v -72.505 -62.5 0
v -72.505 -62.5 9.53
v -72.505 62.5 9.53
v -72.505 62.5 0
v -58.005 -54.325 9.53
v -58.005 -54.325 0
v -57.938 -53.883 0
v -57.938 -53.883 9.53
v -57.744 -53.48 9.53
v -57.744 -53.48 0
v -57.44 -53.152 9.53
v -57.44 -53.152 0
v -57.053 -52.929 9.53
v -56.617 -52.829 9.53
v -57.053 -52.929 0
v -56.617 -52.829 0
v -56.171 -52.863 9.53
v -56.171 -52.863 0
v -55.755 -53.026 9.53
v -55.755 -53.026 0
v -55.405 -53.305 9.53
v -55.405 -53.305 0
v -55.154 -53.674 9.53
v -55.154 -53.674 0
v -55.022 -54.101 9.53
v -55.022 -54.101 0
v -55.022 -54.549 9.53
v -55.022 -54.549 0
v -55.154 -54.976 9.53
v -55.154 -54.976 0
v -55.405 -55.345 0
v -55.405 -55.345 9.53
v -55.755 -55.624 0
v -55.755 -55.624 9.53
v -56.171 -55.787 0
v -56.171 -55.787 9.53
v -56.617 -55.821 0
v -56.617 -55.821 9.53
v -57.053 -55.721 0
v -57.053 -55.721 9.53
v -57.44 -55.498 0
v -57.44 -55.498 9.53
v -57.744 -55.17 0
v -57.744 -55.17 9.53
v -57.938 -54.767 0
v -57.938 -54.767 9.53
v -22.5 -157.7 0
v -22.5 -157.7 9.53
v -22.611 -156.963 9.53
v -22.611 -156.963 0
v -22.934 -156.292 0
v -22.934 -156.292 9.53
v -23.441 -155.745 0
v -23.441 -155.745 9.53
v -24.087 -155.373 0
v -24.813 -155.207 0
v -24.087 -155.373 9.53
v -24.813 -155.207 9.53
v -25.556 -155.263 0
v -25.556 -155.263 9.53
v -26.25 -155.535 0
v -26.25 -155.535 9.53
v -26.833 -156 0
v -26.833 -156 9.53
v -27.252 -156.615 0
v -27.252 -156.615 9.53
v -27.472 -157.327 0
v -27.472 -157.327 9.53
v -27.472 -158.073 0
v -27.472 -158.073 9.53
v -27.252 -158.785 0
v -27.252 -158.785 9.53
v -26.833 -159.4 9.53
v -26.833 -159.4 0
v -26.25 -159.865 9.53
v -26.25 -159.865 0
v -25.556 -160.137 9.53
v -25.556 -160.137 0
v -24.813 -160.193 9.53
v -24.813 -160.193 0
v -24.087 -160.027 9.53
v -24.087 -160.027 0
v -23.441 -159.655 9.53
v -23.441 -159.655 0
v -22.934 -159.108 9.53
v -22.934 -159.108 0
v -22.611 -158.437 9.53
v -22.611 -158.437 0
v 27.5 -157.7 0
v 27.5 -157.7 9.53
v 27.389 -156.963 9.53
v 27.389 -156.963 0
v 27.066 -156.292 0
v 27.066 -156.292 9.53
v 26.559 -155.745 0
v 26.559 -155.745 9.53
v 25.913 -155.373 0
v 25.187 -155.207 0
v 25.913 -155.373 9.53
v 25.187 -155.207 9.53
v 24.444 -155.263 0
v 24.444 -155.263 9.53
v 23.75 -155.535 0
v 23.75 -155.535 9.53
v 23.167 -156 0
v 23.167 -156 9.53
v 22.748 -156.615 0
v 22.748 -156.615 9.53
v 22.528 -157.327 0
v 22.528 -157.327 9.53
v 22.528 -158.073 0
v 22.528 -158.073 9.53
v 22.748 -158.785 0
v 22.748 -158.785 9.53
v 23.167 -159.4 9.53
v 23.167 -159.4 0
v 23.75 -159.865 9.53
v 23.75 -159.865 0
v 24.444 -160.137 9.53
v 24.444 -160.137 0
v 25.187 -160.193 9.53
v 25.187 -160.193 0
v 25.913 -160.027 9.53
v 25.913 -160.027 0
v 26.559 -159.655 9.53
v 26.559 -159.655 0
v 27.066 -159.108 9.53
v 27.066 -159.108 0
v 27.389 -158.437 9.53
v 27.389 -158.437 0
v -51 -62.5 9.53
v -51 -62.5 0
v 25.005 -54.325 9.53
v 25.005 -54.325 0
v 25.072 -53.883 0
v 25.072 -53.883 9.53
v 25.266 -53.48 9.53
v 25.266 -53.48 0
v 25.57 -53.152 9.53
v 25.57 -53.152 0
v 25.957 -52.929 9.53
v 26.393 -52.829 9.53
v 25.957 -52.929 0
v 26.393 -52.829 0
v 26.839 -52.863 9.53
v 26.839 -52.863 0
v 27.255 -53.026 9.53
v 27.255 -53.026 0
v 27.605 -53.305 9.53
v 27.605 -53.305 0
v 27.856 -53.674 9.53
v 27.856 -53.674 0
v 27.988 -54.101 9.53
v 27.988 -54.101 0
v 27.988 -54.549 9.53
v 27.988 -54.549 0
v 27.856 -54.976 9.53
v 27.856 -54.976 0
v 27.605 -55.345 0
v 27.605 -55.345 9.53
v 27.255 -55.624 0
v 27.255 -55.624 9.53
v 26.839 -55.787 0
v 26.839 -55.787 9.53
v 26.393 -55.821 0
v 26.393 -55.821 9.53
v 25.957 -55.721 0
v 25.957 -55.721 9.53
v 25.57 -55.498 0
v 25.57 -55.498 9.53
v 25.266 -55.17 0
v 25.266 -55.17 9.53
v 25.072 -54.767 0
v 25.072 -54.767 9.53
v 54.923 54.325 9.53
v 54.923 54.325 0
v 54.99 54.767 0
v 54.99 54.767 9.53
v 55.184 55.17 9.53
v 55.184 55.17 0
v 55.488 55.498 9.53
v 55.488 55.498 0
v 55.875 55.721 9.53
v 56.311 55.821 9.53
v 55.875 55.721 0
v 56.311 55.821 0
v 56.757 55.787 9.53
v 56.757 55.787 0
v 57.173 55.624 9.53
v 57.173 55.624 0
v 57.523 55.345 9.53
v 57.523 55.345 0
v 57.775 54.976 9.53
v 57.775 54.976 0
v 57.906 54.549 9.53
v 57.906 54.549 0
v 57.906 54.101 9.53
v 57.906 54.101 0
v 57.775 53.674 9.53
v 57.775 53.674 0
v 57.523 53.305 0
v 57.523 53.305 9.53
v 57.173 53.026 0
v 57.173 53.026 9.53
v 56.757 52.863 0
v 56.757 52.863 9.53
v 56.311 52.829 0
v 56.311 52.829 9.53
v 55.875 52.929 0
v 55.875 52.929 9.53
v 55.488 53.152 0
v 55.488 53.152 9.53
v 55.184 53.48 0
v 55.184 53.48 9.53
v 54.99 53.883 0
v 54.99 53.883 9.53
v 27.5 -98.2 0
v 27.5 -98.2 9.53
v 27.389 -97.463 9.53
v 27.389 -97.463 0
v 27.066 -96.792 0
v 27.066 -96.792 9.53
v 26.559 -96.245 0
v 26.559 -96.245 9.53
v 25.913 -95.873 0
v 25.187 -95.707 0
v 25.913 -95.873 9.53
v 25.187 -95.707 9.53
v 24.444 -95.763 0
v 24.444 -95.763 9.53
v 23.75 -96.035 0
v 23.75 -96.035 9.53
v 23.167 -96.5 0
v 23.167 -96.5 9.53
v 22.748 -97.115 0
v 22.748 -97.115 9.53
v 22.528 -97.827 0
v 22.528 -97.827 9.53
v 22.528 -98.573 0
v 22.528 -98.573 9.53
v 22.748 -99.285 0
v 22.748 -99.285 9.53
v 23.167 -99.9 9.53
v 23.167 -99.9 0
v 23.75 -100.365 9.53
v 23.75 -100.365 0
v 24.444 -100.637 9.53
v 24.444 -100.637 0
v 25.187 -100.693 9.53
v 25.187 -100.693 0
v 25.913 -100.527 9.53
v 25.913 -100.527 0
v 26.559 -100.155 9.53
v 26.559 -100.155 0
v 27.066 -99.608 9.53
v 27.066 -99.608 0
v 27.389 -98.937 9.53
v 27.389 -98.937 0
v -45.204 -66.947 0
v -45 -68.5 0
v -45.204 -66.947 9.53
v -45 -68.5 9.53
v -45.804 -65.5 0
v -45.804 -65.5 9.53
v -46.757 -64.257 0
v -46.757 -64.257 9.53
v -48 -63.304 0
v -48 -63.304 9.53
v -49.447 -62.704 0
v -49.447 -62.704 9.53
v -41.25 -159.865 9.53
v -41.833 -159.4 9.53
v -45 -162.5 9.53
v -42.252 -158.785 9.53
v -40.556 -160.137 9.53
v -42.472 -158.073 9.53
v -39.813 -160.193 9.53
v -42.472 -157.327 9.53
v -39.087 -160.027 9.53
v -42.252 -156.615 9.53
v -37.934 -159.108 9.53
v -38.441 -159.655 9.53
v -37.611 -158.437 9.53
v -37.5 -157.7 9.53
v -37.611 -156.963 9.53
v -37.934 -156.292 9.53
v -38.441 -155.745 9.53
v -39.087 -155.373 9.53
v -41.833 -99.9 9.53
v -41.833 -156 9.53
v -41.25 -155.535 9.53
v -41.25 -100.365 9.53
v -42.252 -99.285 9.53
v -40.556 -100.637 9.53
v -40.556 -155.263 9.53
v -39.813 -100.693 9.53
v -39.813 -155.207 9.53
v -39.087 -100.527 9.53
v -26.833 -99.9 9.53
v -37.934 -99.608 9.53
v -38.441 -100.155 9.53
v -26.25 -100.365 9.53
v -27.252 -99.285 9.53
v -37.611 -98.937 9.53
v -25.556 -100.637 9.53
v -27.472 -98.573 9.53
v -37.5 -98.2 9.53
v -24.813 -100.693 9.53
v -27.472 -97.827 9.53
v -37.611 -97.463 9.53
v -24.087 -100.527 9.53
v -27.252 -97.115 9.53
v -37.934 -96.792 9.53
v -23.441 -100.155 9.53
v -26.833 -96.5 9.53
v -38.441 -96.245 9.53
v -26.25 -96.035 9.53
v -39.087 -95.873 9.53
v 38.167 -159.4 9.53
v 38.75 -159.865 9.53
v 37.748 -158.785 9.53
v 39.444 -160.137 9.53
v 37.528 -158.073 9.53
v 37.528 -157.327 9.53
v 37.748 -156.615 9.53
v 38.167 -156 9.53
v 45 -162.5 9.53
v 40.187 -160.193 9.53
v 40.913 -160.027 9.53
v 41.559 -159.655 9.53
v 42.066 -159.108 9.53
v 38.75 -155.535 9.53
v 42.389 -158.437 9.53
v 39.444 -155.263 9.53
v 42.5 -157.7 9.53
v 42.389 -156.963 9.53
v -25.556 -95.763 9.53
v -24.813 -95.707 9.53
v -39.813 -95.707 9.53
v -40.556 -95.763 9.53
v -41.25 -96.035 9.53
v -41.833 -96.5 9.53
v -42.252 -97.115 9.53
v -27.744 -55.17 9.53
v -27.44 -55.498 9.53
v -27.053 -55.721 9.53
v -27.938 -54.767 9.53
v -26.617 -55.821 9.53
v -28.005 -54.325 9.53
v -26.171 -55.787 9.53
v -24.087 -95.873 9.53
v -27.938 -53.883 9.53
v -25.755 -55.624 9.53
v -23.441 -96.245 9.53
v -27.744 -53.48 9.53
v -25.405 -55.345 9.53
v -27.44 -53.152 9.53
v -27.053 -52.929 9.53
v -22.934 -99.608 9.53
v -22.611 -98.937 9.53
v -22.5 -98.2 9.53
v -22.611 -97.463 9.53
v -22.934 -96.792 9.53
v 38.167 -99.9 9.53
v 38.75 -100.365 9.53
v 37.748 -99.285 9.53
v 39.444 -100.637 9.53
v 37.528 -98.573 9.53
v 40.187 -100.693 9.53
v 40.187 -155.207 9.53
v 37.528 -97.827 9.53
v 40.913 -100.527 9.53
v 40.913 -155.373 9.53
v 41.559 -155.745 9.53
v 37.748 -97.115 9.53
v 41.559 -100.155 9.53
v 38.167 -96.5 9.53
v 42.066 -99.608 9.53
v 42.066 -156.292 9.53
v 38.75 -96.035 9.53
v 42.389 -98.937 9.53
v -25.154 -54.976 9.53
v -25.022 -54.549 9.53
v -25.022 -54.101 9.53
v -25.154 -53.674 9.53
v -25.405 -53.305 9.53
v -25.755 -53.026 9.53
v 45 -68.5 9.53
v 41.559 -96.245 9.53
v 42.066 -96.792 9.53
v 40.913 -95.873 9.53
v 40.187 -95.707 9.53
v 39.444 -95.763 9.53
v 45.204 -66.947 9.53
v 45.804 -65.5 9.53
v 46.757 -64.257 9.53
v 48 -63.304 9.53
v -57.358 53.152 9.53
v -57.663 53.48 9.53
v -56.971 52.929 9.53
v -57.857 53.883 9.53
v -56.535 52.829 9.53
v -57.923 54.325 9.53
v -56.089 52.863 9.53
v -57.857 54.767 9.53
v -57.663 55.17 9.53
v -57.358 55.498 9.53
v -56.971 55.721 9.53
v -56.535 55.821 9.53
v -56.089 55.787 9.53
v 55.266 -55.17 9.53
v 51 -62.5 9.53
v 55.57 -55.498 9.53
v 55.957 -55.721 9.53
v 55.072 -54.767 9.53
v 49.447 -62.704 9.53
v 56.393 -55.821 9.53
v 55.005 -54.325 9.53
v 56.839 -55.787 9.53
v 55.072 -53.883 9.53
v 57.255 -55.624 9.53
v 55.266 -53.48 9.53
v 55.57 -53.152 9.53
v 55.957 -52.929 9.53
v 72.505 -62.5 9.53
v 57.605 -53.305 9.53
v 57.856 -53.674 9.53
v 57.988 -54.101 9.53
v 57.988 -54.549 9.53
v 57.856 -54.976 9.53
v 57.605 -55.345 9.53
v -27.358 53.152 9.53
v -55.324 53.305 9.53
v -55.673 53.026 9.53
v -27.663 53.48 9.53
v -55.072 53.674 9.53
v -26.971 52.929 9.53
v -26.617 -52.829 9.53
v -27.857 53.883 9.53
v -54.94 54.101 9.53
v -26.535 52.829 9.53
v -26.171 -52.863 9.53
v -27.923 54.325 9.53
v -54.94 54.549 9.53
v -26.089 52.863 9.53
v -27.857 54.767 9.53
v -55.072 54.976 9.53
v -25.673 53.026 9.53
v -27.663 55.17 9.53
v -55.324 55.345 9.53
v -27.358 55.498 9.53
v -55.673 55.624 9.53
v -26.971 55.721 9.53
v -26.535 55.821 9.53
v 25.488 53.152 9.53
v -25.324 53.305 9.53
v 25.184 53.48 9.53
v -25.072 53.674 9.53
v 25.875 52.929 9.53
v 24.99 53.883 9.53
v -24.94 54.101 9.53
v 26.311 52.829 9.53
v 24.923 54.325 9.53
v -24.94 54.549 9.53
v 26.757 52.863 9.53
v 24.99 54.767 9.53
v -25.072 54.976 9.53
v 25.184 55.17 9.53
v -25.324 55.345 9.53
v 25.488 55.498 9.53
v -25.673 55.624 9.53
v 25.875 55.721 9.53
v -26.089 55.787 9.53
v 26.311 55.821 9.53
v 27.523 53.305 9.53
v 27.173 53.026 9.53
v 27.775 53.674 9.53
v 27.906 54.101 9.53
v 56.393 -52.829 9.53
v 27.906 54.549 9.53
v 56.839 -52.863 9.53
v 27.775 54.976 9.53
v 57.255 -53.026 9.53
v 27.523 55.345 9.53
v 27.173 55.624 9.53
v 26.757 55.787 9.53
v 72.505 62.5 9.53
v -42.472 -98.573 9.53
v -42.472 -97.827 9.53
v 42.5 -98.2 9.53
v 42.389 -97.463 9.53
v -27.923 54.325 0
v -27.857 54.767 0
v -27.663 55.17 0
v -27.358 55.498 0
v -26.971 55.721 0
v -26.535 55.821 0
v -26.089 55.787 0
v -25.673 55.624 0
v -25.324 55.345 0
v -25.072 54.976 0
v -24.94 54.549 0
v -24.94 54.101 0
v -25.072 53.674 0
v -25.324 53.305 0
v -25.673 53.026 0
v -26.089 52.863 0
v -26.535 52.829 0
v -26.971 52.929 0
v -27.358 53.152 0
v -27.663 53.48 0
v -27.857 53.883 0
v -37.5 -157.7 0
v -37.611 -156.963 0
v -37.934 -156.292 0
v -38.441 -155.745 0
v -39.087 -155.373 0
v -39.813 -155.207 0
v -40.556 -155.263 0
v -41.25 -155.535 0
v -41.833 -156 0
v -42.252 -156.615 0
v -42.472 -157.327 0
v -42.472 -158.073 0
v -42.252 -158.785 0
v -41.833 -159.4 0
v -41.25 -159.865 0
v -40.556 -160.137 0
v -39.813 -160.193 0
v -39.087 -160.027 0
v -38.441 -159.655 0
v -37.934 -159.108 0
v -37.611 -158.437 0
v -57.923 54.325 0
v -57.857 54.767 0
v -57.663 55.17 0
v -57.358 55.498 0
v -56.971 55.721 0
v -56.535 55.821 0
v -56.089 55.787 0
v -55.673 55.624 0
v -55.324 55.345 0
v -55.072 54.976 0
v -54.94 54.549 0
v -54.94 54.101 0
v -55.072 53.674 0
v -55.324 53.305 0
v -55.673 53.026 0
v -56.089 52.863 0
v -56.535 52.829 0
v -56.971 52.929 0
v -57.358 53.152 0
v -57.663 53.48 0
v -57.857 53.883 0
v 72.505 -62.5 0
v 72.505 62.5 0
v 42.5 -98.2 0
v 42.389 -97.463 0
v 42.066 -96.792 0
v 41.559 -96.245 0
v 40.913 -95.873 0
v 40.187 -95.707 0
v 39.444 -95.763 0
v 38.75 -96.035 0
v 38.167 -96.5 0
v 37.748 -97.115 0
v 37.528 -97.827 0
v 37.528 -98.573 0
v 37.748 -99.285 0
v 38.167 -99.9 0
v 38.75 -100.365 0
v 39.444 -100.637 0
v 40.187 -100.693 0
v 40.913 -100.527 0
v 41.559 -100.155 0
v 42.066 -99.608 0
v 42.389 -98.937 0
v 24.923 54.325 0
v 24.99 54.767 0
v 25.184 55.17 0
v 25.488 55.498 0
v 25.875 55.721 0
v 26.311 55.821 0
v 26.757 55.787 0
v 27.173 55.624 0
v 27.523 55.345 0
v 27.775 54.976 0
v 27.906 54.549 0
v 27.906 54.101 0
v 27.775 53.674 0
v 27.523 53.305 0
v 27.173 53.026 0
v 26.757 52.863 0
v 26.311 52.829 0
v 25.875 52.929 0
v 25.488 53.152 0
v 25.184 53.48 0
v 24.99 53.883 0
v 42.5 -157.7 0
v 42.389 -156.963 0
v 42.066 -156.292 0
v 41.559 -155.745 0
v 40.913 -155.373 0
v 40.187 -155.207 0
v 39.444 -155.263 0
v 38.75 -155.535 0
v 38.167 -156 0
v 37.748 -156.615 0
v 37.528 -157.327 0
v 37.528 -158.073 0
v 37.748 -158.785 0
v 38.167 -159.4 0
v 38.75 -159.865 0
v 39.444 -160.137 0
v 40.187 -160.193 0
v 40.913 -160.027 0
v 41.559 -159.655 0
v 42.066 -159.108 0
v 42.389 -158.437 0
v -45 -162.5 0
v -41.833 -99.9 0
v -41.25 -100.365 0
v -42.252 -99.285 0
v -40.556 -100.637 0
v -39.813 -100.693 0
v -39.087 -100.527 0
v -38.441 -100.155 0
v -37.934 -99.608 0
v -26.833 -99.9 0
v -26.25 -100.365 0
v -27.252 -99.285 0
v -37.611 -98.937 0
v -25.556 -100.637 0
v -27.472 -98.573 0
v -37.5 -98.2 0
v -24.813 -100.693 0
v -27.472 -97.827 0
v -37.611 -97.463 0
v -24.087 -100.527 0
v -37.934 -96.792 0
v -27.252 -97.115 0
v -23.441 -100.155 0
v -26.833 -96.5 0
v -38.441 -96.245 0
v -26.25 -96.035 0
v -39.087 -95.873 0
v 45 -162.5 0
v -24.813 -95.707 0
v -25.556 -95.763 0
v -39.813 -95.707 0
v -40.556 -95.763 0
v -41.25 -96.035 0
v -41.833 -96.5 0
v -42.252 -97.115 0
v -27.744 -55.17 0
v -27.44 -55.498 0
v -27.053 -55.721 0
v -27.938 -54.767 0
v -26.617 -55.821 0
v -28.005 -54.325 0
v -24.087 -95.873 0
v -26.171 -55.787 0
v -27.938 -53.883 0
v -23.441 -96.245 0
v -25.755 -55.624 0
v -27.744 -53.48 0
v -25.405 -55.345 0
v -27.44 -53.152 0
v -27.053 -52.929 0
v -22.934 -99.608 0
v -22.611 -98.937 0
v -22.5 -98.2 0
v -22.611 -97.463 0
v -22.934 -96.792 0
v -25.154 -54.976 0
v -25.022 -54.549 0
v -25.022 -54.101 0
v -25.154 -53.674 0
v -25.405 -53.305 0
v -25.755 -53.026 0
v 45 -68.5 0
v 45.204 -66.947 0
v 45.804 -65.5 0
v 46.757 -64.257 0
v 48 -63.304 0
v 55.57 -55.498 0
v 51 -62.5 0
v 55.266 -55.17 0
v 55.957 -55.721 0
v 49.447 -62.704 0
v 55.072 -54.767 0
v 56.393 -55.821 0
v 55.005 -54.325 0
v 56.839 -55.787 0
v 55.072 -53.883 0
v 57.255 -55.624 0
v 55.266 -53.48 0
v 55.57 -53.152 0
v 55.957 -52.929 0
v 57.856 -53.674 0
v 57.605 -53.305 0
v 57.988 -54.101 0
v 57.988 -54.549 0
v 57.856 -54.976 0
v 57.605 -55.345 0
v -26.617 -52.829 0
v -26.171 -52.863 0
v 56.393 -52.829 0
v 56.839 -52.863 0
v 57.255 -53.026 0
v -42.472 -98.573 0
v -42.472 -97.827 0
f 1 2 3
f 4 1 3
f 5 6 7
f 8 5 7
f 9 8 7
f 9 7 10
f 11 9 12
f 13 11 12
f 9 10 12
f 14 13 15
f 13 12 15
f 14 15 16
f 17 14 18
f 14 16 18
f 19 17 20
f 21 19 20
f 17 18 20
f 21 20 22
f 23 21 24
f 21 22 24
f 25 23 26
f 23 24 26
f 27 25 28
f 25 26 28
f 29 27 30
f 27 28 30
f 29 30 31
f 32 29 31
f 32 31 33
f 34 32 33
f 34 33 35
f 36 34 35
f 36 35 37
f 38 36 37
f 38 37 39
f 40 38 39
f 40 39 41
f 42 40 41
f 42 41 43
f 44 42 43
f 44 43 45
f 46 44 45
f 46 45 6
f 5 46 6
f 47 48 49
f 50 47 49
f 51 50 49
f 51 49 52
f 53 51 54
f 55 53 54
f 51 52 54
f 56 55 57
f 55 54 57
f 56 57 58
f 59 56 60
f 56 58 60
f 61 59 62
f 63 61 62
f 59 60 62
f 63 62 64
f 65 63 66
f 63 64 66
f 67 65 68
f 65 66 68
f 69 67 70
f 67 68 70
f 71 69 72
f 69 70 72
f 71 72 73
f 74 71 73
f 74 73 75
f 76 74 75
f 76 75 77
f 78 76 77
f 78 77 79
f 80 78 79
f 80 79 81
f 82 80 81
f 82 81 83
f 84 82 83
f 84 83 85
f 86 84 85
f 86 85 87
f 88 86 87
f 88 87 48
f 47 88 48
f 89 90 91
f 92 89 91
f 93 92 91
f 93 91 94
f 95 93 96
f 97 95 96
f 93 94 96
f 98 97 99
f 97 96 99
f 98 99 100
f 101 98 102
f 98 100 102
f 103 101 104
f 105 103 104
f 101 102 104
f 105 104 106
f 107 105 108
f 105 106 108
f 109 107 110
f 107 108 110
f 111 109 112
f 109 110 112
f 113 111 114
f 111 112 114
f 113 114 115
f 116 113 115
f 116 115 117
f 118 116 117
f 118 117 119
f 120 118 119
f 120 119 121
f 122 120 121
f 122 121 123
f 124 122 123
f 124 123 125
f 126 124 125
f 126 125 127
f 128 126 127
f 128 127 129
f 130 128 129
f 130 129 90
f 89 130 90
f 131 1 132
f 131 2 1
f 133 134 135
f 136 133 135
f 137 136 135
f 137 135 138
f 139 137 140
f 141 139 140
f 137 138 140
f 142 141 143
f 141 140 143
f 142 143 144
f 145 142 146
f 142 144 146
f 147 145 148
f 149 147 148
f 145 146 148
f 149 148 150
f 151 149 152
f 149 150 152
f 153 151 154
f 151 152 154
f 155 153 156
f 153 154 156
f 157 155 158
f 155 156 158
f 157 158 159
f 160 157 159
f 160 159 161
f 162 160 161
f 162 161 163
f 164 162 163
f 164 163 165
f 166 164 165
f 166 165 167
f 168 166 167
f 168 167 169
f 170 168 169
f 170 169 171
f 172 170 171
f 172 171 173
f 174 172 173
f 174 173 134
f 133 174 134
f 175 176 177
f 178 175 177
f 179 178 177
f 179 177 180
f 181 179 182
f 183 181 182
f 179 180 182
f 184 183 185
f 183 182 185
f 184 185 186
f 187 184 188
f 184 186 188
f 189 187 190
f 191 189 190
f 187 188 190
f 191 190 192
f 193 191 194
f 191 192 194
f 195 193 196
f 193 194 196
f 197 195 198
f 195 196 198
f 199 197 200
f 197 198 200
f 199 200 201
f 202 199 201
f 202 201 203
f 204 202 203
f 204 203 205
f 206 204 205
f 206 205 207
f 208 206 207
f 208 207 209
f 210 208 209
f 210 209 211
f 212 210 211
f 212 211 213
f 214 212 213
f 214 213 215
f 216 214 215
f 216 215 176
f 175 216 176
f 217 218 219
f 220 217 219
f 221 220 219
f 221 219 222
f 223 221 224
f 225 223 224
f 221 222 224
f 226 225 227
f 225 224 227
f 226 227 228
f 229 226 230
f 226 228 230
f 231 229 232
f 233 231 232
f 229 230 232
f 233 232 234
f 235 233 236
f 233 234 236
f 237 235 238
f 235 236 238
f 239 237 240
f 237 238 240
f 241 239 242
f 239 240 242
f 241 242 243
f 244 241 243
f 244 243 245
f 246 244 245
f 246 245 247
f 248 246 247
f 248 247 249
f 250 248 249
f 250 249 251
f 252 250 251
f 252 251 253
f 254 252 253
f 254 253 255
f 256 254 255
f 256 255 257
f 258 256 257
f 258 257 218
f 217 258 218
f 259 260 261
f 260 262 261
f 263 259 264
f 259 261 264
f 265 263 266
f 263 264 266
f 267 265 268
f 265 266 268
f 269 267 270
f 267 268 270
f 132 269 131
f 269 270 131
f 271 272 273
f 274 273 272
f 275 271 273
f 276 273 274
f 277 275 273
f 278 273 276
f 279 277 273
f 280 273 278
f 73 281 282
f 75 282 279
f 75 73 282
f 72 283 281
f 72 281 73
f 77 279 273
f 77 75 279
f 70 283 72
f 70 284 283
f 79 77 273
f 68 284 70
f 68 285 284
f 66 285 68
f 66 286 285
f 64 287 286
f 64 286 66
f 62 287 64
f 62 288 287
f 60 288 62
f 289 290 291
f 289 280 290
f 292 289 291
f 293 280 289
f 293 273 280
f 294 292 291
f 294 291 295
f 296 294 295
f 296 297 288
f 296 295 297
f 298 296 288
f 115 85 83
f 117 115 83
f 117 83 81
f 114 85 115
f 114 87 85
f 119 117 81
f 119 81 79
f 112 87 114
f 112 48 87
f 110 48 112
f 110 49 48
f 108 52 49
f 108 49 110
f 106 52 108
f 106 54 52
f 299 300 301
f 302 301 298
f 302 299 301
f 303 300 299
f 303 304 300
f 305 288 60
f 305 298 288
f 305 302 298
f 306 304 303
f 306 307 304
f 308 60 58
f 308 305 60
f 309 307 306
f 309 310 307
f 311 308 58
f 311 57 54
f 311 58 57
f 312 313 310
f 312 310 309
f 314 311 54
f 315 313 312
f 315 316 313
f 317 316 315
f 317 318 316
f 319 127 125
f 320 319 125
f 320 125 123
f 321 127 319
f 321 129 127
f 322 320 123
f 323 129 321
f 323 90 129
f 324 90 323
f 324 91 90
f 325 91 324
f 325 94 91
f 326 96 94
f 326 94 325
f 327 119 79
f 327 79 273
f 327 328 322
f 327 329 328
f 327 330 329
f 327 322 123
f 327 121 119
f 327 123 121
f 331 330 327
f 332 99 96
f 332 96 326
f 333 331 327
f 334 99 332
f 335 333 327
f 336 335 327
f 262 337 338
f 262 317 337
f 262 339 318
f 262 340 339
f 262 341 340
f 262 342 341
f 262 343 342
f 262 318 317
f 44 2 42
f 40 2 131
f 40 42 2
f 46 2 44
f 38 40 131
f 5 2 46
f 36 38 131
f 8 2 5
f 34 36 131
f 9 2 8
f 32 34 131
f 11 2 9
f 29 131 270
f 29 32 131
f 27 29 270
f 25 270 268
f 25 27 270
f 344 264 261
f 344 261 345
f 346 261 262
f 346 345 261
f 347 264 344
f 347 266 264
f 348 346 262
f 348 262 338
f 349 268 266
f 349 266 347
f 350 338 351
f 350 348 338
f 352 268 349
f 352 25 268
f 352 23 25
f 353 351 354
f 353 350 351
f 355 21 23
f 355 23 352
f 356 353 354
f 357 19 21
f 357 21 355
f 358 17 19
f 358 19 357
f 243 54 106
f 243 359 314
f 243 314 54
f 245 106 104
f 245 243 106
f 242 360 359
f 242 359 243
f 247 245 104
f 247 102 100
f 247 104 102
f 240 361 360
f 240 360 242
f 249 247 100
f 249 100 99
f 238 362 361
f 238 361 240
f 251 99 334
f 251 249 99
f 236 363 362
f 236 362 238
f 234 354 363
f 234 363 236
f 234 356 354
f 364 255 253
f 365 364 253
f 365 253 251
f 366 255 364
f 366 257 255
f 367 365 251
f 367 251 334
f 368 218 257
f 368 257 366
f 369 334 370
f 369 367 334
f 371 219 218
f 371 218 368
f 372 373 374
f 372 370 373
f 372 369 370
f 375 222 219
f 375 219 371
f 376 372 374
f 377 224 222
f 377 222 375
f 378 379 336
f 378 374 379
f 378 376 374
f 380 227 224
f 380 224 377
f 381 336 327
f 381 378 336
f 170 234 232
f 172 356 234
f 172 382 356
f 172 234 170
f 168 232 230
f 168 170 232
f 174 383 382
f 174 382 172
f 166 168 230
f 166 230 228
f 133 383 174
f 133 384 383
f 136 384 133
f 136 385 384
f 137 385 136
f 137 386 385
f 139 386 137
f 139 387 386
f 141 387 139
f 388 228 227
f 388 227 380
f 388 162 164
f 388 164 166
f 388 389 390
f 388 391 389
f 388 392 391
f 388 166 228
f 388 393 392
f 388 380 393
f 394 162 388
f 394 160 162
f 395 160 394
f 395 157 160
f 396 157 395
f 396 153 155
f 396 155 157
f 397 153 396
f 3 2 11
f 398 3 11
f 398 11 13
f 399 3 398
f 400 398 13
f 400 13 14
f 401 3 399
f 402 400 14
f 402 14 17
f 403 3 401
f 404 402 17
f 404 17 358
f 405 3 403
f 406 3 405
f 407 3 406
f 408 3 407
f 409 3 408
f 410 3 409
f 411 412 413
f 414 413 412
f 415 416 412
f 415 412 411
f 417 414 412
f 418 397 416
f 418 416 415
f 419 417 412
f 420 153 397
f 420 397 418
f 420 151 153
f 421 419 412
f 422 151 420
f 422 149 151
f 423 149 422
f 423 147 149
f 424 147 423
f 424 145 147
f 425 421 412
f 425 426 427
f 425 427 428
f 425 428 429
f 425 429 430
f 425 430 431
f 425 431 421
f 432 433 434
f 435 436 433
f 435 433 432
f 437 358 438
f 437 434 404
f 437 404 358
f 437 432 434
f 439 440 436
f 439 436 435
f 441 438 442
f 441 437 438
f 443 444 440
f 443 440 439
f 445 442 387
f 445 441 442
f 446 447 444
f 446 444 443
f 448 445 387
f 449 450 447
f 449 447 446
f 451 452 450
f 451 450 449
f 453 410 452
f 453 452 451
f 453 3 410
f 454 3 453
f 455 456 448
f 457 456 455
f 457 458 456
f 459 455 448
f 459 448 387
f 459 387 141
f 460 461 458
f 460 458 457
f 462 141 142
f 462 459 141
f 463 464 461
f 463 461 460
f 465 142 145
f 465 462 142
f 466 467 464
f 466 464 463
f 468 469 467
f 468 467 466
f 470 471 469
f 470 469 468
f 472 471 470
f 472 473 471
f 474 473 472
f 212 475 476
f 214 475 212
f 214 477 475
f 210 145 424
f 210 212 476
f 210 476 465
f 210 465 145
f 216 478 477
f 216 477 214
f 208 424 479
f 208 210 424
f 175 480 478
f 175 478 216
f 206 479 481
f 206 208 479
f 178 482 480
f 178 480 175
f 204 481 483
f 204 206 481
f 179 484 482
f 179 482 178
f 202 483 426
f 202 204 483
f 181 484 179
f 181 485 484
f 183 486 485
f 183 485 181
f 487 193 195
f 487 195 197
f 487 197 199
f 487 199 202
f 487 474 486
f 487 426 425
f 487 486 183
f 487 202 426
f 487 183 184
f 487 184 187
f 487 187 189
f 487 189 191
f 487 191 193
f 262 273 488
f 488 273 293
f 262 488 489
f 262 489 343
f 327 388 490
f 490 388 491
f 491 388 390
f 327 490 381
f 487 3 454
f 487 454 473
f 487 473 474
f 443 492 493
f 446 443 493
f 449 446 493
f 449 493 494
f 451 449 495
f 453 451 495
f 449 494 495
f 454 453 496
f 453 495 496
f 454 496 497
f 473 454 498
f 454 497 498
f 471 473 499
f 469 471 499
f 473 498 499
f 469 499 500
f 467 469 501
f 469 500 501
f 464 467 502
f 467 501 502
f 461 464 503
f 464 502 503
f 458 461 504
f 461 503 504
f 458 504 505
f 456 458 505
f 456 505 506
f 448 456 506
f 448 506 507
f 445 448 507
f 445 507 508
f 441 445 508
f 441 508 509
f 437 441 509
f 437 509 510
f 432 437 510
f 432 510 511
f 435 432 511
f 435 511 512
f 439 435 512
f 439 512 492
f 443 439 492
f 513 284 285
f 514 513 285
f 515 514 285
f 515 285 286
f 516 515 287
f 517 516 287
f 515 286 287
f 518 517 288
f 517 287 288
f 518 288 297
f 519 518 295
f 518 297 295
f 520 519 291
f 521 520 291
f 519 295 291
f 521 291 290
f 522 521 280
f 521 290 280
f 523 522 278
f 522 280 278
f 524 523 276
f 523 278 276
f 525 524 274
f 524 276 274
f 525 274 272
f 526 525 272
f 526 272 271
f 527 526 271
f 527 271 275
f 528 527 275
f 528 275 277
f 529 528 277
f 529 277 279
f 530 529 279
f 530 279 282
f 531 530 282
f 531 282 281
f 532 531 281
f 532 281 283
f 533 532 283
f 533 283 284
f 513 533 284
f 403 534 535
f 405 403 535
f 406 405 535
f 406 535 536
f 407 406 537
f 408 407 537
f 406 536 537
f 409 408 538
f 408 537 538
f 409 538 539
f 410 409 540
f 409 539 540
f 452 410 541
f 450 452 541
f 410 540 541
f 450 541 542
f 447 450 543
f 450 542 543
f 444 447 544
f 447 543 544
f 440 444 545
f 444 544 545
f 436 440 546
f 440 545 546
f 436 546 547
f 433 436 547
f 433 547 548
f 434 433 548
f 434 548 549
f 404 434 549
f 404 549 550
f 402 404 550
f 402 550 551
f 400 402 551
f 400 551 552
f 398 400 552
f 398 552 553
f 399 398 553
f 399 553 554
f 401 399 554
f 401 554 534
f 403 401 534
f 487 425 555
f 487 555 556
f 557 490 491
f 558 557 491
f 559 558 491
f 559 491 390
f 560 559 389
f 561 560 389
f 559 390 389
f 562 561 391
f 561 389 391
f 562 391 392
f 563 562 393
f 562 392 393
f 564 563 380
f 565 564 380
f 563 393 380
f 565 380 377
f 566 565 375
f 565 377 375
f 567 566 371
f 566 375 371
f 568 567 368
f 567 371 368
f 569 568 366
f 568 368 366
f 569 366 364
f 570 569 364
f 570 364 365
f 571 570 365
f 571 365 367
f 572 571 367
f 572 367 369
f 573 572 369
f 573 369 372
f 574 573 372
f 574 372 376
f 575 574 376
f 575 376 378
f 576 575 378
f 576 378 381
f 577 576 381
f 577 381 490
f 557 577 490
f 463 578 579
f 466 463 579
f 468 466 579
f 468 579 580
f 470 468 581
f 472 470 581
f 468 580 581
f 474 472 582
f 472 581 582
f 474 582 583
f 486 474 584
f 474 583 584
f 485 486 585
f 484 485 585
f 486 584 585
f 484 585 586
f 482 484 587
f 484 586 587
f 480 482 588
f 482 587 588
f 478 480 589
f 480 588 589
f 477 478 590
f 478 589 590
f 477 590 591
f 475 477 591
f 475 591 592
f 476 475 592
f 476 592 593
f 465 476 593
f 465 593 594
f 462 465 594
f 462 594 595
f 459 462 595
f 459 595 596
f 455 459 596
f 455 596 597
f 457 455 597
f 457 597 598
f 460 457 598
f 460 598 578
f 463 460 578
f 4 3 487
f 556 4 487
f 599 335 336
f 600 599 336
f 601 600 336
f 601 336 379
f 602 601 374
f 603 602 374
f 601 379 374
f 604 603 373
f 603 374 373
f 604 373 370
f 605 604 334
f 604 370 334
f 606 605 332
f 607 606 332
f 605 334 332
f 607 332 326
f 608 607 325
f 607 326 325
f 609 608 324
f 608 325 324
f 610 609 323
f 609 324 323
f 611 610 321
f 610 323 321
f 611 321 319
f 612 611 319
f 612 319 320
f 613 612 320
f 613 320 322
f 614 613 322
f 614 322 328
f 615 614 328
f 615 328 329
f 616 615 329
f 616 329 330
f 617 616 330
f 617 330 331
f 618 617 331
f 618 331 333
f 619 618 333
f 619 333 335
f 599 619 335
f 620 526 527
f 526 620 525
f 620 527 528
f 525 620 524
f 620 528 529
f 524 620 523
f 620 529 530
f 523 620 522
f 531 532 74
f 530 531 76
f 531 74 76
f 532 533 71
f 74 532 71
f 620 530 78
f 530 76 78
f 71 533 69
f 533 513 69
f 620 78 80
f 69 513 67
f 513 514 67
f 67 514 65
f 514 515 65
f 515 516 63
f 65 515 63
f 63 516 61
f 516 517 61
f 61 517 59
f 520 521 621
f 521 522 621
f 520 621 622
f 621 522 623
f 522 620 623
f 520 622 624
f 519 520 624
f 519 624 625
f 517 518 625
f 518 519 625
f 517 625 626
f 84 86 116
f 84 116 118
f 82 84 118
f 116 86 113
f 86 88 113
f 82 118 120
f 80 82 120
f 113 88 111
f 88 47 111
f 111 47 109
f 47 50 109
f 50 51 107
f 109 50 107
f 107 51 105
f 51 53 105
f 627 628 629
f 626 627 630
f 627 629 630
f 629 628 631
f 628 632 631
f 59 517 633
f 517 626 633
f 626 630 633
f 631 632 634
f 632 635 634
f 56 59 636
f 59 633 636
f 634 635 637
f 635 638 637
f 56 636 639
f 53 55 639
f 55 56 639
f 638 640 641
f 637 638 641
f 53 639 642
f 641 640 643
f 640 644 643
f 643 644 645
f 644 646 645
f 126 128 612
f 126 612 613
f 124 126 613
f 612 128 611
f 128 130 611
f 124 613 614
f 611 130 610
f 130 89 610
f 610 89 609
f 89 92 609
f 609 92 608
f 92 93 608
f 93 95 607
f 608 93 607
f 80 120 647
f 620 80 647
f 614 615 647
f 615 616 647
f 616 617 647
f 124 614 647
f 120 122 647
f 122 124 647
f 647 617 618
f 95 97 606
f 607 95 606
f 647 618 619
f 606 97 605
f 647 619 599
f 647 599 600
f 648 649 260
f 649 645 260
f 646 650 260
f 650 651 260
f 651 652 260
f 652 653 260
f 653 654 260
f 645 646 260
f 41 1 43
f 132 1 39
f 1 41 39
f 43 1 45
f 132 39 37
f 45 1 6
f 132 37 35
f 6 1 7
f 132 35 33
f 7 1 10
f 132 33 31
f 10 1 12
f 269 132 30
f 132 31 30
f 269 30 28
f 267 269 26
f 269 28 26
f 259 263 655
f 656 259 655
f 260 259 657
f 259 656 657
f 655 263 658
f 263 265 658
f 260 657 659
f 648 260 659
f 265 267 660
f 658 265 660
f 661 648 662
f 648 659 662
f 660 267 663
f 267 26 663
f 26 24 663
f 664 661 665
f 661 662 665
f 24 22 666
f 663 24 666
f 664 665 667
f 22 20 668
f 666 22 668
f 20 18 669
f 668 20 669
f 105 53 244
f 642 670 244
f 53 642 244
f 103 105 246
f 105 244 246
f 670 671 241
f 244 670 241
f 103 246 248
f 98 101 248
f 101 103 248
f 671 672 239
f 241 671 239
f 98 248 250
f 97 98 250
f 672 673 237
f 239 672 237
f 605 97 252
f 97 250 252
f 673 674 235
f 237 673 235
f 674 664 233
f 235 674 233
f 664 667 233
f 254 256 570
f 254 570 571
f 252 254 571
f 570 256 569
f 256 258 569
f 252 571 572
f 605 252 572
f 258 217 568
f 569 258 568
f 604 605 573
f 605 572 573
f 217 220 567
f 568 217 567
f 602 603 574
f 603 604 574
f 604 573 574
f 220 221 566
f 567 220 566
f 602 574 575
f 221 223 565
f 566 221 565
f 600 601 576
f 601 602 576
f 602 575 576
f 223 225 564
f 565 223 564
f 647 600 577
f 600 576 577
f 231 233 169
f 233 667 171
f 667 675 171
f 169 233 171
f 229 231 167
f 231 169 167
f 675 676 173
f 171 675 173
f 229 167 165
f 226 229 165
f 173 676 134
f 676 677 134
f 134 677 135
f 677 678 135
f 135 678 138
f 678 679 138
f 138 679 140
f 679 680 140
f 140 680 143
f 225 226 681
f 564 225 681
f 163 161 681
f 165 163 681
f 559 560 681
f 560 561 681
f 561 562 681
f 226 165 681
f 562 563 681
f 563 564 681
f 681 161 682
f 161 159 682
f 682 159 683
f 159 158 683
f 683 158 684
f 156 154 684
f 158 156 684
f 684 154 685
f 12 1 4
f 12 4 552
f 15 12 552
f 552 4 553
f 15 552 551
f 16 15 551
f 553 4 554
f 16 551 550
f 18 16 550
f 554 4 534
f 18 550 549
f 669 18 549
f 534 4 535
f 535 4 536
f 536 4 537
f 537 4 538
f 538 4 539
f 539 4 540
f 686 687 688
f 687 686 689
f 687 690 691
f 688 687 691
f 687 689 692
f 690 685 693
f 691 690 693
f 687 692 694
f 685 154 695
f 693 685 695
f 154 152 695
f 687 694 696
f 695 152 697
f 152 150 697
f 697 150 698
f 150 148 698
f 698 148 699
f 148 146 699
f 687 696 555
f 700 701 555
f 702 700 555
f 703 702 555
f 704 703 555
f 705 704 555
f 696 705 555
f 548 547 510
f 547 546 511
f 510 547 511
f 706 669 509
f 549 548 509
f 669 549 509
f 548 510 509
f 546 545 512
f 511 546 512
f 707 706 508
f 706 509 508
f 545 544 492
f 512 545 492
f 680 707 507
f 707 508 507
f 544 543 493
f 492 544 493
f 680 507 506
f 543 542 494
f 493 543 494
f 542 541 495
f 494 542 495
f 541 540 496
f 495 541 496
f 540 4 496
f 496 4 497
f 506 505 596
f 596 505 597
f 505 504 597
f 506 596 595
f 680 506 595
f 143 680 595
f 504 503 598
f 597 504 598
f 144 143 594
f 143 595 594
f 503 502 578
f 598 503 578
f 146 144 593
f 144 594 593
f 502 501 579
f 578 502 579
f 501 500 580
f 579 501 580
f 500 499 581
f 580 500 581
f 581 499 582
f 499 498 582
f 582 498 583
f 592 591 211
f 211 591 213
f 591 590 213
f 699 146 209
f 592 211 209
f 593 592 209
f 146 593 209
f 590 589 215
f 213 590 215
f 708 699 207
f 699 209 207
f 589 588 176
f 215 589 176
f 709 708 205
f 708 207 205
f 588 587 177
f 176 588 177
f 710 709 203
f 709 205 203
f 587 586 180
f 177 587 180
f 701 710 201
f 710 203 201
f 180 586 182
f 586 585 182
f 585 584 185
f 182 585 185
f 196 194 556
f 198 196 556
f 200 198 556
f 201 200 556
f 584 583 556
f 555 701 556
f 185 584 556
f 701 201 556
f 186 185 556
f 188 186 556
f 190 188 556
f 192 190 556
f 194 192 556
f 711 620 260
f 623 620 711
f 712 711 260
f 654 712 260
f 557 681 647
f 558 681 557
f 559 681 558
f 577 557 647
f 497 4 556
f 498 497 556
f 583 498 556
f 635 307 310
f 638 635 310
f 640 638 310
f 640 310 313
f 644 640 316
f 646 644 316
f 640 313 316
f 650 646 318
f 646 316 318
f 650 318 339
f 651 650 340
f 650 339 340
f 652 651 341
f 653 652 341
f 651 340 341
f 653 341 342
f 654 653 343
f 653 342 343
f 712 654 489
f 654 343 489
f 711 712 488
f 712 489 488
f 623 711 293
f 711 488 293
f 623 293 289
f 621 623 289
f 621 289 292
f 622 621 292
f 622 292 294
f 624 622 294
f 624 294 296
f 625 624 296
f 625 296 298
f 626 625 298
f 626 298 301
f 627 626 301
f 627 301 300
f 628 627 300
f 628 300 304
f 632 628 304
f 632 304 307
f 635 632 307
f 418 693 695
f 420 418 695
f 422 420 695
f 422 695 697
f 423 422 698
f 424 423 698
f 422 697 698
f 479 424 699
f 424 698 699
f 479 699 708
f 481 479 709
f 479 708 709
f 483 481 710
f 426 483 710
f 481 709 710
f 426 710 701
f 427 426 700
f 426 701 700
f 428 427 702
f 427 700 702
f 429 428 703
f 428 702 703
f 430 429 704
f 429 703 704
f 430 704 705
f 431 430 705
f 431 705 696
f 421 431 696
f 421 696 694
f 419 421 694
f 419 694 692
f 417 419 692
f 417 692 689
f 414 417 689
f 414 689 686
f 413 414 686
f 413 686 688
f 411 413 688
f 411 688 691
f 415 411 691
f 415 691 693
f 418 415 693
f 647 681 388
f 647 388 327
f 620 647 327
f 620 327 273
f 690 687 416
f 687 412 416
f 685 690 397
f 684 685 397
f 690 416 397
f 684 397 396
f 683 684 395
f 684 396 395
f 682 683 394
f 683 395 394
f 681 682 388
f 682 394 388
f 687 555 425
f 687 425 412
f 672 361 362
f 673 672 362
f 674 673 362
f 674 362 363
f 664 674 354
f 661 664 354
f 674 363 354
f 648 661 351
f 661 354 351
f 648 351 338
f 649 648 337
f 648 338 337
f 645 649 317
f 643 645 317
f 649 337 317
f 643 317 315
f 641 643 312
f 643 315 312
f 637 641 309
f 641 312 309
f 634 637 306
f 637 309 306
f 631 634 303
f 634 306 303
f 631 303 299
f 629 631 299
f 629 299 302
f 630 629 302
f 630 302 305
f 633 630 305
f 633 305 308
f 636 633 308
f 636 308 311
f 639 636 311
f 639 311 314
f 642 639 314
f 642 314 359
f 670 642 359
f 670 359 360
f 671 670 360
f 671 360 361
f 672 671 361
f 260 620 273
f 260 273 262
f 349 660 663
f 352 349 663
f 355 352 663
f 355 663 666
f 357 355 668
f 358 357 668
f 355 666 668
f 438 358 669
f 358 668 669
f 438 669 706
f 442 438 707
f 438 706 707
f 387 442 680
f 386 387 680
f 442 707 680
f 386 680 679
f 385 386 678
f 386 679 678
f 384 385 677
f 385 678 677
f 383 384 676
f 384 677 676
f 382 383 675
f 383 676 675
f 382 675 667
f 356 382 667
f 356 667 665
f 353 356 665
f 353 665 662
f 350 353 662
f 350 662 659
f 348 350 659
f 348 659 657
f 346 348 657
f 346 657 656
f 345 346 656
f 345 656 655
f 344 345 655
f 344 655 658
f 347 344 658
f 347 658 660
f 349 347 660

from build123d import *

# Parameters (mm, degrees)
RESSALTO_EXTRUS_O1_DEPTH = 9.53
CORTE_EXTRUS_O1_REACH    = 179.792
ESBO_O2_R                = 2.5
CORTE_EXTRUS_O2_REACH    = 179.792
ESBO_O3_R                = 1.5
CROQUIS1_W               = 1
CROQUIS1_H               = 125
SALIENTE_EXTRUIR1_DEPTH  = 9.53
REDONDEO1_R              = 6


with BuildPart() as part:
    # Esboço1 → Ressalto-extrusão1 (new body)
    with BuildSketch(Plane.XY):
        Polygon((-71.505, 62.5), (71.505, 62.5), (71.505, -62.5), (45, -62.5), (45, -162.5), (-45, -162.5), (-45, -62.5), (-71.505, -62.5), align=None)
    extrude(amount=RESSALTO_EXTRUS_O1_DEPTH)

    # Esboço2 → Corte-extrusão1 (cut, up to next)
    with BuildSketch(Plane.XY.offset(9.53), mode=Mode.PRIVATE) as corte_extrus_o1_sk1:
        with Locations((-40, -157.7)):
            Circle(ESBO_O2_R)
    corte_extrus_o1_tool1 = extrude(corte_extrus_o1_sk1.sketch, amount=-CORTE_EXTRUS_O1_REACH, mode=Mode.PRIVATE) & part.part
    # Esboço2 → Corte-extrusão1 (cut, up to next)
    with BuildSketch(Plane.XY.offset(9.53), mode=Mode.PRIVATE) as corte_extrus_o1_sk2:
        with Locations((-25, -157.7)):
            Circle(ESBO_O2_R)
    corte_extrus_o1_tool2 = extrude(corte_extrus_o1_sk2.sketch, amount=-CORTE_EXTRUS_O1_REACH, mode=Mode.PRIVATE) & part.part
    # Esboço2 → Corte-extrusão1 (cut, up to next)
    with BuildSketch(Plane.XY.offset(9.53), mode=Mode.PRIVATE) as corte_extrus_o1_sk3:
        with Locations((25, -157.7)):
            Circle(ESBO_O2_R)
    corte_extrus_o1_tool3 = extrude(corte_extrus_o1_sk3.sketch, amount=-CORTE_EXTRUS_O1_REACH, mode=Mode.PRIVATE) & part.part
    # Esboço2 → Corte-extrusão1 (cut, up to next)
    with BuildSketch(Plane.XY.offset(9.53), mode=Mode.PRIVATE) as corte_extrus_o1_sk4:
        with Locations((40, -157.7)):
            Circle(ESBO_O2_R)
    corte_extrus_o1_tool4 = extrude(corte_extrus_o1_sk4.sketch, amount=-CORTE_EXTRUS_O1_REACH, mode=Mode.PRIVATE) & part.part
    # Esboço2 → Corte-extrusão1 (cut, up to next)
    with BuildSketch(Plane.XY.offset(9.53), mode=Mode.PRIVATE) as corte_extrus_o1_sk5:
        with Locations((40, -98.2)):
            Circle(ESBO_O2_R)
    corte_extrus_o1_tool5 = extrude(corte_extrus_o1_sk5.sketch, amount=-CORTE_EXTRUS_O1_REACH, mode=Mode.PRIVATE) & part.part
    # Esboço2 → Corte-extrusão1 (cut, up to next)
    with BuildSketch(Plane.XY.offset(9.53), mode=Mode.PRIVATE) as corte_extrus_o1_sk6:
        with Locations((25, -98.2)):
            Circle(ESBO_O2_R)
    corte_extrus_o1_tool6 = extrude(corte_extrus_o1_sk6.sketch, amount=-CORTE_EXTRUS_O1_REACH, mode=Mode.PRIVATE) & part.part
    # Esboço2 → Corte-extrusão1 (cut, up to next)
    with BuildSketch(Plane.XY.offset(9.53), mode=Mode.PRIVATE) as corte_extrus_o1_sk7:
        with Locations((-25, -98.2)):
            Circle(ESBO_O2_R)
    corte_extrus_o1_tool7 = extrude(corte_extrus_o1_sk7.sketch, amount=-CORTE_EXTRUS_O1_REACH, mode=Mode.PRIVATE) & part.part
    # Esboço2 → Corte-extrusão1 (cut, up to next)
    with BuildSketch(Plane.XY.offset(9.53), mode=Mode.PRIVATE) as corte_extrus_o1_sk8:
        with Locations((-40, -98.2)):
            Circle(ESBO_O2_R)
    corte_extrus_o1_tool8 = extrude(corte_extrus_o1_sk8.sketch, amount=-CORTE_EXTRUS_O1_REACH, mode=Mode.PRIVATE) & part.part
    add(corte_extrus_o1_tool1.solids().sort_by_distance((-40, -157.7, 9.53))[0], mode=Mode.SUBTRACT)
    add(corte_extrus_o1_tool2.solids().sort_by_distance((-25, -157.7, 9.53))[0], mode=Mode.SUBTRACT)
    add(corte_extrus_o1_tool3.solids().sort_by_distance((25, -157.7, 9.53))[0], mode=Mode.SUBTRACT)
    add(corte_extrus_o1_tool4.solids().sort_by_distance((40, -157.7, 9.53))[0], mode=Mode.SUBTRACT)
    add(corte_extrus_o1_tool5.solids().sort_by_distance((40, -98.2, 9.53))[0], mode=Mode.SUBTRACT)
    add(corte_extrus_o1_tool6.solids().sort_by_distance((25, -98.2, 9.53))[0], mode=Mode.SUBTRACT)
    add(corte_extrus_o1_tool7.solids().sort_by_distance((-25, -98.2, 9.53))[0], mode=Mode.SUBTRACT)
    add(corte_extrus_o1_tool8.solids().sort_by_distance((-40, -98.2, 9.53))[0], mode=Mode.SUBTRACT)

    # Esboço3 → Corte-extrusão2 (cut, up to next)
    with BuildSketch(Plane(origin=(0, 0, 0), x_dir=(-1, 0, 0), z_dir=(0, 0, -1)), mode=Mode.PRIVATE) as corte_extrus_o2_sk1:
        with Locations((56.505, -54.325)):
            Circle(ESBO_O3_R)
    corte_extrus_o2_tool1 = extrude(corte_extrus_o2_sk1.sketch, amount=-CORTE_EXTRUS_O2_REACH, mode=Mode.PRIVATE) & part.part
    # Esboço3 → Corte-extrusão2 (cut, up to next)
    with BuildSketch(Plane(origin=(0, 0, 0), x_dir=(-1, 0, 0), z_dir=(0, 0, -1)), mode=Mode.PRIVATE) as corte_extrus_o2_sk2:
        with Locations((26.505, -54.325)):
            Circle(ESBO_O3_R)
    corte_extrus_o2_tool2 = extrude(corte_extrus_o2_sk2.sketch, amount=-CORTE_EXTRUS_O2_REACH, mode=Mode.PRIVATE) & part.part
    # Esboço3 → Corte-extrusão2 (cut, up to next)
    with BuildSketch(Plane(origin=(0, 0, 0), x_dir=(-1, 0, 0), z_dir=(0, 0, -1)), mode=Mode.PRIVATE) as corte_extrus_o2_sk3:
        with Locations((-26.505, -54.325)):
            Circle(ESBO_O3_R)
    corte_extrus_o2_tool3 = extrude(corte_extrus_o2_sk3.sketch, amount=-CORTE_EXTRUS_O2_REACH, mode=Mode.PRIVATE) & part.part
    # Esboço3 → Corte-extrusão2 (cut, up to next)
    with BuildSketch(Plane(origin=(0, 0, 0), x_dir=(-1, 0, 0), z_dir=(0, 0, -1)), mode=Mode.PRIVATE) as corte_extrus_o2_sk4:
        with Locations((-56.505, -54.325)):
            Circle(ESBO_O3_R)
    corte_extrus_o2_tool4 = extrude(corte_extrus_o2_sk4.sketch, amount=-CORTE_EXTRUS_O2_REACH, mode=Mode.PRIVATE) & part.part
    # Esboço3 → Corte-extrusão2 (cut, up to next)
    with BuildSketch(Plane(origin=(0, 0, 0), x_dir=(-1, 0, 0), z_dir=(0, 0, -1)), mode=Mode.PRIVATE) as corte_extrus_o2_sk5:
        with Locations((-56.423186497, 54.325)):
            Circle(ESBO_O3_R)
    corte_extrus_o2_tool5 = extrude(corte_extrus_o2_sk5.sketch, amount=-CORTE_EXTRUS_O2_REACH, mode=Mode.PRIVATE) & part.part
    # Esboço3 → Corte-extrusão2 (cut, up to next)
    with BuildSketch(Plane(origin=(0, 0, 0), x_dir=(-1, 0, 0), z_dir=(0, 0, -1)), mode=Mode.PRIVATE) as corte_extrus_o2_sk6:
        with Locations((-26.423186497, 54.325)):
            Circle(ESBO_O3_R)
    corte_extrus_o2_tool6 = extrude(corte_extrus_o2_sk6.sketch, amount=-CORTE_EXTRUS_O2_REACH, mode=Mode.PRIVATE) & part.part
    # Esboço3 → Corte-extrusão2 (cut, up to next)
    with BuildSketch(Plane(origin=(0, 0, 0), x_dir=(-1, 0, 0), z_dir=(0, 0, -1)), mode=Mode.PRIVATE) as corte_extrus_o2_sk7:
        with Locations((56.423186497, 54.325)):
            Circle(ESBO_O3_R)
    corte_extrus_o2_tool7 = extrude(corte_extrus_o2_sk7.sketch, amount=-CORTE_EXTRUS_O2_REACH, mode=Mode.PRIVATE) & part.part
    # Esboço3 → Corte-extrusão2 (cut, up to next)
    with BuildSketch(Plane(origin=(0, 0, 0), x_dir=(-1, 0, 0), z_dir=(0, 0, -1)), mode=Mode.PRIVATE) as corte_extrus_o2_sk8:
        with Locations((26.423186497, 54.325)):
            Circle(ESBO_O3_R)
    corte_extrus_o2_tool8 = extrude(corte_extrus_o2_sk8.sketch, amount=-CORTE_EXTRUS_O2_REACH, mode=Mode.PRIVATE) & part.part
    add(corte_extrus_o2_tool1.solids().sort_by_distance((-56.505, -54.325, 0))[0], mode=Mode.SUBTRACT)
    add(corte_extrus_o2_tool2.solids().sort_by_distance((-26.505, -54.325, 0))[0], mode=Mode.SUBTRACT)
    add(corte_extrus_o2_tool3.solids().sort_by_distance((26.505, -54.325, 0))[0], mode=Mode.SUBTRACT)
    add(corte_extrus_o2_tool4.solids().sort_by_distance((56.505, -54.325, 0))[0], mode=Mode.SUBTRACT)
    add(corte_extrus_o2_tool5.solids().sort_by_distance((56.423186, 54.325, 0))[0], mode=Mode.SUBTRACT)
    add(corte_extrus_o2_tool6.solids().sort_by_distance((26.423186, 54.325, 0))[0], mode=Mode.SUBTRACT)
    add(corte_extrus_o2_tool7.solids().sort_by_distance((-56.423186, 54.325, 0))[0], mode=Mode.SUBTRACT)
    add(corte_extrus_o2_tool8.solids().sort_by_distance((-26.423186, 54.325, 0))[0], mode=Mode.SUBTRACT)

    # Croquis1 → Saliente-Extruir1 (add)
    with BuildSketch(Plane.XY.offset(9.53)):
        with Locations((-72.005, 0)):
            Rectangle(CROQUIS1_W, CROQUIS1_H)
        with Locations((72.005, 0)):
            Rectangle(CROQUIS1_W, CROQUIS1_H)
    extrude(amount=-SALIENTE_EXTRUIR1_DEPTH)

    # Redondeo1
    redondeo1_edges = [part.edges().sort_by_distance(p)[0] for p in [
        (45, -62.5, 4.765),
        (-45, -62.5, 4.765),
    ]]
    fillet(redondeo1_edges, radius=REDONDEO1_R)


solid = part.part
